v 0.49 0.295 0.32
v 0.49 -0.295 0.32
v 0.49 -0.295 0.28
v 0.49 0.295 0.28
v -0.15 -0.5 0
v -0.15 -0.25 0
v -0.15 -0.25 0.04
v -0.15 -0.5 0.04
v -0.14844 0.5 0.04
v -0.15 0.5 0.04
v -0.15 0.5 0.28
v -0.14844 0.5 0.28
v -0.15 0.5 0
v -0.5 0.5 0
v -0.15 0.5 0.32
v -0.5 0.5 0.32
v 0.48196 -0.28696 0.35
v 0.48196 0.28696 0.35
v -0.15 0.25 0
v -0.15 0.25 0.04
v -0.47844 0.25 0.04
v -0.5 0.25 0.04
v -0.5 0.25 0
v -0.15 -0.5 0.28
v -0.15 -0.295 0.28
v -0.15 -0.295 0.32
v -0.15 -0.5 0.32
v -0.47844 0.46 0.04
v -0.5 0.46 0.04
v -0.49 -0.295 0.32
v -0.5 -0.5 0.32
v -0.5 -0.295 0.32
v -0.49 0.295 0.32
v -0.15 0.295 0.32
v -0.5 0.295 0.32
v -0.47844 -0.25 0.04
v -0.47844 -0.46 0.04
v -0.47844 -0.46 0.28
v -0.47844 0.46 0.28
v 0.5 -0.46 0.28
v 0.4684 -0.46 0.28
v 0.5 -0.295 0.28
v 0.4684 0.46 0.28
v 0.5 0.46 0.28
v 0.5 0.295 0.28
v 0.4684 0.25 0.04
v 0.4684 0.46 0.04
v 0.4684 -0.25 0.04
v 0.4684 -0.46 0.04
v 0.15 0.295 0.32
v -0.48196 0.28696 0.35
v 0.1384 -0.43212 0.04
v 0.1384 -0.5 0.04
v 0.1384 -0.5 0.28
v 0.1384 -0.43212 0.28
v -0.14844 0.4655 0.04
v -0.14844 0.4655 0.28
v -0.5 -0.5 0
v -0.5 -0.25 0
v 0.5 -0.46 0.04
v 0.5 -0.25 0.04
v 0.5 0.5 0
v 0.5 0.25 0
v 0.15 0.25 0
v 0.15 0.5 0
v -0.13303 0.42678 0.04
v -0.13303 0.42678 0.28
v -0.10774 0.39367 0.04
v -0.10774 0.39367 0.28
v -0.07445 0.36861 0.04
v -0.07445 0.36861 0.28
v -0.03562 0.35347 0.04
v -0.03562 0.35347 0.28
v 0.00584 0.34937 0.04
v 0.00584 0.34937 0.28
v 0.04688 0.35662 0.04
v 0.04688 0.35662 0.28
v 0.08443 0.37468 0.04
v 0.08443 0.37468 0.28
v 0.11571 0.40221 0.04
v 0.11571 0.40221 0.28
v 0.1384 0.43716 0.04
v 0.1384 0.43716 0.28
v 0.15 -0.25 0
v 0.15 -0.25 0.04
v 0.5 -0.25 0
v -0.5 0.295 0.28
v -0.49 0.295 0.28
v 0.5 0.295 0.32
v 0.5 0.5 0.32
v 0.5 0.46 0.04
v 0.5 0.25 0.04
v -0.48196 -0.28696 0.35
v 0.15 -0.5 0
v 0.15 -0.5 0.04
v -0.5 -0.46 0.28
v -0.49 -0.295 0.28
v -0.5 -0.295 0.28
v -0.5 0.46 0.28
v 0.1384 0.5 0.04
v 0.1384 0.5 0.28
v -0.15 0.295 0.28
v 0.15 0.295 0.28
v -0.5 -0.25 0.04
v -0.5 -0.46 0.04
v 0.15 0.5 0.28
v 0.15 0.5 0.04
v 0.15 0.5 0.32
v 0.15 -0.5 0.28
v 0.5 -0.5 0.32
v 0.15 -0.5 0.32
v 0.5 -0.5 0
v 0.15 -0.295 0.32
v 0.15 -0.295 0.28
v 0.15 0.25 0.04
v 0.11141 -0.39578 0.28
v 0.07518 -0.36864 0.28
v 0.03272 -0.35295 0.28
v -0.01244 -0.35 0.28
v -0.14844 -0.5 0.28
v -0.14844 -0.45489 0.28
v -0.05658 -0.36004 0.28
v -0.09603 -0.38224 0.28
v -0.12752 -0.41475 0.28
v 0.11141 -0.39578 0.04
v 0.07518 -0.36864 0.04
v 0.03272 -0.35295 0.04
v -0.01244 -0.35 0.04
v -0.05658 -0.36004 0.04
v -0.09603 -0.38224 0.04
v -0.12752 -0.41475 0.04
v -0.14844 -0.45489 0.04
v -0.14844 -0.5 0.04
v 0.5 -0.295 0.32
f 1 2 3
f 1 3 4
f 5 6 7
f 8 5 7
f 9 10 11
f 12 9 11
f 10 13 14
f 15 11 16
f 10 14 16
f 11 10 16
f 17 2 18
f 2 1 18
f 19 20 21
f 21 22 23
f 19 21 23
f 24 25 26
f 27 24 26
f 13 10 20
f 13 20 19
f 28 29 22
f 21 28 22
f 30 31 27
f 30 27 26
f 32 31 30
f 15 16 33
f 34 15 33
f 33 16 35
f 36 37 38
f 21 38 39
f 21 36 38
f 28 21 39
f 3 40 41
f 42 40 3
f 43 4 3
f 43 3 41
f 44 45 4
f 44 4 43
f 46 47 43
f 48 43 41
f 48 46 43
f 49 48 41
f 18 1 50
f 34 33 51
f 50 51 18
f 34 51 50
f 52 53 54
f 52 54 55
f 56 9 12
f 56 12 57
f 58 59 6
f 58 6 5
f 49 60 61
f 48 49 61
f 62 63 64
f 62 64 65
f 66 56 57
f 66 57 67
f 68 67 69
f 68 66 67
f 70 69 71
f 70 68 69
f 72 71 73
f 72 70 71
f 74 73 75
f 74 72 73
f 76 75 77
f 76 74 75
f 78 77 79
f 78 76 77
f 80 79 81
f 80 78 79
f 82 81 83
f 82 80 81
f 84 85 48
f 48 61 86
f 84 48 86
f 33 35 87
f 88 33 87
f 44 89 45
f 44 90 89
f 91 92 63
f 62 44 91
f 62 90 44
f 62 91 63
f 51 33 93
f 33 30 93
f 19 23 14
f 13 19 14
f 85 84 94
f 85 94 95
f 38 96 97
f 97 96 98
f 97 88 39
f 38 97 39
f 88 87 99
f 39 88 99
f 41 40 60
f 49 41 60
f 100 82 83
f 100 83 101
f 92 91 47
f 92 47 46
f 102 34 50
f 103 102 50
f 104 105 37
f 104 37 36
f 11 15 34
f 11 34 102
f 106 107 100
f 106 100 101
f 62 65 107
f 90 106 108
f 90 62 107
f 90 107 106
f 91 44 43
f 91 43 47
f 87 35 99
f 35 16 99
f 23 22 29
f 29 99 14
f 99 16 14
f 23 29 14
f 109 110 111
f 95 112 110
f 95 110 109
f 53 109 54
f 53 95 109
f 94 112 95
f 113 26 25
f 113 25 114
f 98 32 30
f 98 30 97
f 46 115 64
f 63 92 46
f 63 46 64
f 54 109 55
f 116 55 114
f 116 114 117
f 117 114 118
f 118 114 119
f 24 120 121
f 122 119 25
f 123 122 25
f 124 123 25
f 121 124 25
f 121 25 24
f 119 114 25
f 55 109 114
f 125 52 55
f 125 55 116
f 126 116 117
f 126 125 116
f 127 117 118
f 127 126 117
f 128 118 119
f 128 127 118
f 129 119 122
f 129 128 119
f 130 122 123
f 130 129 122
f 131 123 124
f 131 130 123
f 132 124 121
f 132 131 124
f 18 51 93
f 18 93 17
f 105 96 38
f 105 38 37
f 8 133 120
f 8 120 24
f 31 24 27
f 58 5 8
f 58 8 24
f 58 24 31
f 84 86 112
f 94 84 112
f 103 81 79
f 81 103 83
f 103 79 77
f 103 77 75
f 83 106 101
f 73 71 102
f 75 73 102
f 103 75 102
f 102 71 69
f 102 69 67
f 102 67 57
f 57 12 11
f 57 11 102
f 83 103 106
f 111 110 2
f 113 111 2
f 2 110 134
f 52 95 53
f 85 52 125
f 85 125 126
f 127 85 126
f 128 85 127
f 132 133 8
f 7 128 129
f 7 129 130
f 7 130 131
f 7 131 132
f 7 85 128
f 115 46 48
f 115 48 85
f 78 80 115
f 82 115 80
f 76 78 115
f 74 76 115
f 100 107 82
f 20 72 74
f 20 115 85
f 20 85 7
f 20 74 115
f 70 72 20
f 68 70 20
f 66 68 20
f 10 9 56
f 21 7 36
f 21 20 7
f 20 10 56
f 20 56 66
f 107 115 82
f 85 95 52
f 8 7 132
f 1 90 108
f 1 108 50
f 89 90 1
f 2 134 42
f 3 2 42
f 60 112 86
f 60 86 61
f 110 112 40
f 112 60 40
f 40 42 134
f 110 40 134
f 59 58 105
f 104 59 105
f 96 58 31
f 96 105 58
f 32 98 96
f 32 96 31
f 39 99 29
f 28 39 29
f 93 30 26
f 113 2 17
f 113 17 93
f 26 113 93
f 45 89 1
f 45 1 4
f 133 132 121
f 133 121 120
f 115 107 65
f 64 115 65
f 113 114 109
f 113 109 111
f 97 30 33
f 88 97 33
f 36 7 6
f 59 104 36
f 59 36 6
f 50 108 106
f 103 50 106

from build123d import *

# Parameters (mm, degrees)
EXTRUDE_START               = 0.04
EXTRUDE_1_DEPTH             = 0.24
EXTRUDE_START_2             = 0.32
SKETCH_2_W                  = 0.98
SKETCH_2_H                  = 0.59
EXTRUDE_1_2_DEPTH           = 0.03
EXTRUDE_1_2_TAPER           = 15
EXTRUDE_1_2_OTHER_WAY_DEPTH = 0.04
EXTRUDE_START_3             = -0.5
EXTRUDE_4_DEPTH             = 0.35
EXTRUDE_START_4             = 0.5
EXTRUDE_5_DEPTH             = 0.35


with BuildPart() as part:
    # Эскиз1 → Extrude 1 (new body)
    with BuildSketch(Plane.XY.offset(EXTRUDE_START)):
        with BuildLine():
            Line((-0.148442184, 0.5), (-0.148442184, 0.465497277))
            ThreePointArc((-0.148442184, 0.465497277), (-0.015030241, 0.35), (0.138400017, 0.437163772))
            Line((0.138400017, 0.437163772), (0.138400017, 0.5))
            Line((0.138400017, 0.5), (0.468400017, 0.5))
            Line((0.468400017, 0.5), (0.468400017, -0.5))
            Line((0.468400017, -0.5), (0.138400017, -0.5))
            Line((0.138400017, -0.5), (0.138400017, -0.432115302))
            ThreePointArc((0.138400017, -0.432115302), (-0.01244424, -0.35), (-0.148442184, -0.454887902))
            Line((-0.148442184, -0.454887902), (-0.148442184, -0.5))
            Line((-0.148442184, -0.5), (-0.478442184, -0.5))
            Line((-0.478442184, -0.5), (-0.478442184, 0.5))
            Line((-0.478442184, 0.5), (-0.148442184, 0.5))
        make_face()
    extrude(amount=EXTRUDE_1_DEPTH)

    # Эскиз2 → Extrude 1 2 (add)
    with BuildSketch(Plane.XY.offset(EXTRUDE_START_2)):
        Rectangle(SKETCH_2_W, SKETCH_2_H)
    extrude(amount=EXTRUDE_1_2_DEPTH, taper=EXTRUDE_1_2_TAPER)

    # Эскиз2 → Extrude 1 2 other way (add)
    with BuildSketch(Plane.XY.offset(EXTRUDE_START_2)):
        Rectangle(SKETCH_2_W, SKETCH_2_H)
    extrude(amount=-EXTRUDE_1_2_OTHER_WAY_DEPTH)

    # Эскиз3<2> → Бобышка-Вытянуть4 (add)
    with BuildSketch(Plane(origin=(0, 0, 0), x_dir=(0, 0, -1), z_dir=(1, 0, 0)).offset(EXTRUDE_START_3)):
        Polygon((-0.32, 0.295), (-0.28, 0.295), (-0.28, 0.46), (-0.04, 0.46), (-0.04, 0.25), (0, 0.25), (0, 0.5), (-0.32, 0.5), align=None)
        Polygon((-0.04, -0.25), (0, -0.25), (0, -0.5), (-0.32, -0.5), (-0.32, -0.295), (-0.28, -0.295), (-0.28, -0.46), (-0.04, -0.46), align=None)
    extrude(amount=EXTRUDE_4_DEPTH)

    # Эскиз3 → Бобышка-Вытянуть5 (add)
    with BuildSketch(Plane(origin=(0, 0, 0), x_dir=(0, 0, -1), z_dir=(1, 0, 0)).offset(EXTRUDE_START_4)):
        Polygon((-0.32, 0.295), (-0.28, 0.295), (-0.28, 0.46), (-0.04, 0.46), (-0.04, 0.25), (0, 0.25), (0, 0.5), (-0.32, 0.5), align=None)
        Polygon((-0.04, -0.25), (0, -0.25), (0, -0.5), (-0.32, -0.5), (-0.32, -0.295), (-0.28, -0.295), (-0.28, -0.46), (-0.04, -0.46), align=None)
    extrude(amount=-EXTRUDE_5_DEPTH)


solid = part.part
